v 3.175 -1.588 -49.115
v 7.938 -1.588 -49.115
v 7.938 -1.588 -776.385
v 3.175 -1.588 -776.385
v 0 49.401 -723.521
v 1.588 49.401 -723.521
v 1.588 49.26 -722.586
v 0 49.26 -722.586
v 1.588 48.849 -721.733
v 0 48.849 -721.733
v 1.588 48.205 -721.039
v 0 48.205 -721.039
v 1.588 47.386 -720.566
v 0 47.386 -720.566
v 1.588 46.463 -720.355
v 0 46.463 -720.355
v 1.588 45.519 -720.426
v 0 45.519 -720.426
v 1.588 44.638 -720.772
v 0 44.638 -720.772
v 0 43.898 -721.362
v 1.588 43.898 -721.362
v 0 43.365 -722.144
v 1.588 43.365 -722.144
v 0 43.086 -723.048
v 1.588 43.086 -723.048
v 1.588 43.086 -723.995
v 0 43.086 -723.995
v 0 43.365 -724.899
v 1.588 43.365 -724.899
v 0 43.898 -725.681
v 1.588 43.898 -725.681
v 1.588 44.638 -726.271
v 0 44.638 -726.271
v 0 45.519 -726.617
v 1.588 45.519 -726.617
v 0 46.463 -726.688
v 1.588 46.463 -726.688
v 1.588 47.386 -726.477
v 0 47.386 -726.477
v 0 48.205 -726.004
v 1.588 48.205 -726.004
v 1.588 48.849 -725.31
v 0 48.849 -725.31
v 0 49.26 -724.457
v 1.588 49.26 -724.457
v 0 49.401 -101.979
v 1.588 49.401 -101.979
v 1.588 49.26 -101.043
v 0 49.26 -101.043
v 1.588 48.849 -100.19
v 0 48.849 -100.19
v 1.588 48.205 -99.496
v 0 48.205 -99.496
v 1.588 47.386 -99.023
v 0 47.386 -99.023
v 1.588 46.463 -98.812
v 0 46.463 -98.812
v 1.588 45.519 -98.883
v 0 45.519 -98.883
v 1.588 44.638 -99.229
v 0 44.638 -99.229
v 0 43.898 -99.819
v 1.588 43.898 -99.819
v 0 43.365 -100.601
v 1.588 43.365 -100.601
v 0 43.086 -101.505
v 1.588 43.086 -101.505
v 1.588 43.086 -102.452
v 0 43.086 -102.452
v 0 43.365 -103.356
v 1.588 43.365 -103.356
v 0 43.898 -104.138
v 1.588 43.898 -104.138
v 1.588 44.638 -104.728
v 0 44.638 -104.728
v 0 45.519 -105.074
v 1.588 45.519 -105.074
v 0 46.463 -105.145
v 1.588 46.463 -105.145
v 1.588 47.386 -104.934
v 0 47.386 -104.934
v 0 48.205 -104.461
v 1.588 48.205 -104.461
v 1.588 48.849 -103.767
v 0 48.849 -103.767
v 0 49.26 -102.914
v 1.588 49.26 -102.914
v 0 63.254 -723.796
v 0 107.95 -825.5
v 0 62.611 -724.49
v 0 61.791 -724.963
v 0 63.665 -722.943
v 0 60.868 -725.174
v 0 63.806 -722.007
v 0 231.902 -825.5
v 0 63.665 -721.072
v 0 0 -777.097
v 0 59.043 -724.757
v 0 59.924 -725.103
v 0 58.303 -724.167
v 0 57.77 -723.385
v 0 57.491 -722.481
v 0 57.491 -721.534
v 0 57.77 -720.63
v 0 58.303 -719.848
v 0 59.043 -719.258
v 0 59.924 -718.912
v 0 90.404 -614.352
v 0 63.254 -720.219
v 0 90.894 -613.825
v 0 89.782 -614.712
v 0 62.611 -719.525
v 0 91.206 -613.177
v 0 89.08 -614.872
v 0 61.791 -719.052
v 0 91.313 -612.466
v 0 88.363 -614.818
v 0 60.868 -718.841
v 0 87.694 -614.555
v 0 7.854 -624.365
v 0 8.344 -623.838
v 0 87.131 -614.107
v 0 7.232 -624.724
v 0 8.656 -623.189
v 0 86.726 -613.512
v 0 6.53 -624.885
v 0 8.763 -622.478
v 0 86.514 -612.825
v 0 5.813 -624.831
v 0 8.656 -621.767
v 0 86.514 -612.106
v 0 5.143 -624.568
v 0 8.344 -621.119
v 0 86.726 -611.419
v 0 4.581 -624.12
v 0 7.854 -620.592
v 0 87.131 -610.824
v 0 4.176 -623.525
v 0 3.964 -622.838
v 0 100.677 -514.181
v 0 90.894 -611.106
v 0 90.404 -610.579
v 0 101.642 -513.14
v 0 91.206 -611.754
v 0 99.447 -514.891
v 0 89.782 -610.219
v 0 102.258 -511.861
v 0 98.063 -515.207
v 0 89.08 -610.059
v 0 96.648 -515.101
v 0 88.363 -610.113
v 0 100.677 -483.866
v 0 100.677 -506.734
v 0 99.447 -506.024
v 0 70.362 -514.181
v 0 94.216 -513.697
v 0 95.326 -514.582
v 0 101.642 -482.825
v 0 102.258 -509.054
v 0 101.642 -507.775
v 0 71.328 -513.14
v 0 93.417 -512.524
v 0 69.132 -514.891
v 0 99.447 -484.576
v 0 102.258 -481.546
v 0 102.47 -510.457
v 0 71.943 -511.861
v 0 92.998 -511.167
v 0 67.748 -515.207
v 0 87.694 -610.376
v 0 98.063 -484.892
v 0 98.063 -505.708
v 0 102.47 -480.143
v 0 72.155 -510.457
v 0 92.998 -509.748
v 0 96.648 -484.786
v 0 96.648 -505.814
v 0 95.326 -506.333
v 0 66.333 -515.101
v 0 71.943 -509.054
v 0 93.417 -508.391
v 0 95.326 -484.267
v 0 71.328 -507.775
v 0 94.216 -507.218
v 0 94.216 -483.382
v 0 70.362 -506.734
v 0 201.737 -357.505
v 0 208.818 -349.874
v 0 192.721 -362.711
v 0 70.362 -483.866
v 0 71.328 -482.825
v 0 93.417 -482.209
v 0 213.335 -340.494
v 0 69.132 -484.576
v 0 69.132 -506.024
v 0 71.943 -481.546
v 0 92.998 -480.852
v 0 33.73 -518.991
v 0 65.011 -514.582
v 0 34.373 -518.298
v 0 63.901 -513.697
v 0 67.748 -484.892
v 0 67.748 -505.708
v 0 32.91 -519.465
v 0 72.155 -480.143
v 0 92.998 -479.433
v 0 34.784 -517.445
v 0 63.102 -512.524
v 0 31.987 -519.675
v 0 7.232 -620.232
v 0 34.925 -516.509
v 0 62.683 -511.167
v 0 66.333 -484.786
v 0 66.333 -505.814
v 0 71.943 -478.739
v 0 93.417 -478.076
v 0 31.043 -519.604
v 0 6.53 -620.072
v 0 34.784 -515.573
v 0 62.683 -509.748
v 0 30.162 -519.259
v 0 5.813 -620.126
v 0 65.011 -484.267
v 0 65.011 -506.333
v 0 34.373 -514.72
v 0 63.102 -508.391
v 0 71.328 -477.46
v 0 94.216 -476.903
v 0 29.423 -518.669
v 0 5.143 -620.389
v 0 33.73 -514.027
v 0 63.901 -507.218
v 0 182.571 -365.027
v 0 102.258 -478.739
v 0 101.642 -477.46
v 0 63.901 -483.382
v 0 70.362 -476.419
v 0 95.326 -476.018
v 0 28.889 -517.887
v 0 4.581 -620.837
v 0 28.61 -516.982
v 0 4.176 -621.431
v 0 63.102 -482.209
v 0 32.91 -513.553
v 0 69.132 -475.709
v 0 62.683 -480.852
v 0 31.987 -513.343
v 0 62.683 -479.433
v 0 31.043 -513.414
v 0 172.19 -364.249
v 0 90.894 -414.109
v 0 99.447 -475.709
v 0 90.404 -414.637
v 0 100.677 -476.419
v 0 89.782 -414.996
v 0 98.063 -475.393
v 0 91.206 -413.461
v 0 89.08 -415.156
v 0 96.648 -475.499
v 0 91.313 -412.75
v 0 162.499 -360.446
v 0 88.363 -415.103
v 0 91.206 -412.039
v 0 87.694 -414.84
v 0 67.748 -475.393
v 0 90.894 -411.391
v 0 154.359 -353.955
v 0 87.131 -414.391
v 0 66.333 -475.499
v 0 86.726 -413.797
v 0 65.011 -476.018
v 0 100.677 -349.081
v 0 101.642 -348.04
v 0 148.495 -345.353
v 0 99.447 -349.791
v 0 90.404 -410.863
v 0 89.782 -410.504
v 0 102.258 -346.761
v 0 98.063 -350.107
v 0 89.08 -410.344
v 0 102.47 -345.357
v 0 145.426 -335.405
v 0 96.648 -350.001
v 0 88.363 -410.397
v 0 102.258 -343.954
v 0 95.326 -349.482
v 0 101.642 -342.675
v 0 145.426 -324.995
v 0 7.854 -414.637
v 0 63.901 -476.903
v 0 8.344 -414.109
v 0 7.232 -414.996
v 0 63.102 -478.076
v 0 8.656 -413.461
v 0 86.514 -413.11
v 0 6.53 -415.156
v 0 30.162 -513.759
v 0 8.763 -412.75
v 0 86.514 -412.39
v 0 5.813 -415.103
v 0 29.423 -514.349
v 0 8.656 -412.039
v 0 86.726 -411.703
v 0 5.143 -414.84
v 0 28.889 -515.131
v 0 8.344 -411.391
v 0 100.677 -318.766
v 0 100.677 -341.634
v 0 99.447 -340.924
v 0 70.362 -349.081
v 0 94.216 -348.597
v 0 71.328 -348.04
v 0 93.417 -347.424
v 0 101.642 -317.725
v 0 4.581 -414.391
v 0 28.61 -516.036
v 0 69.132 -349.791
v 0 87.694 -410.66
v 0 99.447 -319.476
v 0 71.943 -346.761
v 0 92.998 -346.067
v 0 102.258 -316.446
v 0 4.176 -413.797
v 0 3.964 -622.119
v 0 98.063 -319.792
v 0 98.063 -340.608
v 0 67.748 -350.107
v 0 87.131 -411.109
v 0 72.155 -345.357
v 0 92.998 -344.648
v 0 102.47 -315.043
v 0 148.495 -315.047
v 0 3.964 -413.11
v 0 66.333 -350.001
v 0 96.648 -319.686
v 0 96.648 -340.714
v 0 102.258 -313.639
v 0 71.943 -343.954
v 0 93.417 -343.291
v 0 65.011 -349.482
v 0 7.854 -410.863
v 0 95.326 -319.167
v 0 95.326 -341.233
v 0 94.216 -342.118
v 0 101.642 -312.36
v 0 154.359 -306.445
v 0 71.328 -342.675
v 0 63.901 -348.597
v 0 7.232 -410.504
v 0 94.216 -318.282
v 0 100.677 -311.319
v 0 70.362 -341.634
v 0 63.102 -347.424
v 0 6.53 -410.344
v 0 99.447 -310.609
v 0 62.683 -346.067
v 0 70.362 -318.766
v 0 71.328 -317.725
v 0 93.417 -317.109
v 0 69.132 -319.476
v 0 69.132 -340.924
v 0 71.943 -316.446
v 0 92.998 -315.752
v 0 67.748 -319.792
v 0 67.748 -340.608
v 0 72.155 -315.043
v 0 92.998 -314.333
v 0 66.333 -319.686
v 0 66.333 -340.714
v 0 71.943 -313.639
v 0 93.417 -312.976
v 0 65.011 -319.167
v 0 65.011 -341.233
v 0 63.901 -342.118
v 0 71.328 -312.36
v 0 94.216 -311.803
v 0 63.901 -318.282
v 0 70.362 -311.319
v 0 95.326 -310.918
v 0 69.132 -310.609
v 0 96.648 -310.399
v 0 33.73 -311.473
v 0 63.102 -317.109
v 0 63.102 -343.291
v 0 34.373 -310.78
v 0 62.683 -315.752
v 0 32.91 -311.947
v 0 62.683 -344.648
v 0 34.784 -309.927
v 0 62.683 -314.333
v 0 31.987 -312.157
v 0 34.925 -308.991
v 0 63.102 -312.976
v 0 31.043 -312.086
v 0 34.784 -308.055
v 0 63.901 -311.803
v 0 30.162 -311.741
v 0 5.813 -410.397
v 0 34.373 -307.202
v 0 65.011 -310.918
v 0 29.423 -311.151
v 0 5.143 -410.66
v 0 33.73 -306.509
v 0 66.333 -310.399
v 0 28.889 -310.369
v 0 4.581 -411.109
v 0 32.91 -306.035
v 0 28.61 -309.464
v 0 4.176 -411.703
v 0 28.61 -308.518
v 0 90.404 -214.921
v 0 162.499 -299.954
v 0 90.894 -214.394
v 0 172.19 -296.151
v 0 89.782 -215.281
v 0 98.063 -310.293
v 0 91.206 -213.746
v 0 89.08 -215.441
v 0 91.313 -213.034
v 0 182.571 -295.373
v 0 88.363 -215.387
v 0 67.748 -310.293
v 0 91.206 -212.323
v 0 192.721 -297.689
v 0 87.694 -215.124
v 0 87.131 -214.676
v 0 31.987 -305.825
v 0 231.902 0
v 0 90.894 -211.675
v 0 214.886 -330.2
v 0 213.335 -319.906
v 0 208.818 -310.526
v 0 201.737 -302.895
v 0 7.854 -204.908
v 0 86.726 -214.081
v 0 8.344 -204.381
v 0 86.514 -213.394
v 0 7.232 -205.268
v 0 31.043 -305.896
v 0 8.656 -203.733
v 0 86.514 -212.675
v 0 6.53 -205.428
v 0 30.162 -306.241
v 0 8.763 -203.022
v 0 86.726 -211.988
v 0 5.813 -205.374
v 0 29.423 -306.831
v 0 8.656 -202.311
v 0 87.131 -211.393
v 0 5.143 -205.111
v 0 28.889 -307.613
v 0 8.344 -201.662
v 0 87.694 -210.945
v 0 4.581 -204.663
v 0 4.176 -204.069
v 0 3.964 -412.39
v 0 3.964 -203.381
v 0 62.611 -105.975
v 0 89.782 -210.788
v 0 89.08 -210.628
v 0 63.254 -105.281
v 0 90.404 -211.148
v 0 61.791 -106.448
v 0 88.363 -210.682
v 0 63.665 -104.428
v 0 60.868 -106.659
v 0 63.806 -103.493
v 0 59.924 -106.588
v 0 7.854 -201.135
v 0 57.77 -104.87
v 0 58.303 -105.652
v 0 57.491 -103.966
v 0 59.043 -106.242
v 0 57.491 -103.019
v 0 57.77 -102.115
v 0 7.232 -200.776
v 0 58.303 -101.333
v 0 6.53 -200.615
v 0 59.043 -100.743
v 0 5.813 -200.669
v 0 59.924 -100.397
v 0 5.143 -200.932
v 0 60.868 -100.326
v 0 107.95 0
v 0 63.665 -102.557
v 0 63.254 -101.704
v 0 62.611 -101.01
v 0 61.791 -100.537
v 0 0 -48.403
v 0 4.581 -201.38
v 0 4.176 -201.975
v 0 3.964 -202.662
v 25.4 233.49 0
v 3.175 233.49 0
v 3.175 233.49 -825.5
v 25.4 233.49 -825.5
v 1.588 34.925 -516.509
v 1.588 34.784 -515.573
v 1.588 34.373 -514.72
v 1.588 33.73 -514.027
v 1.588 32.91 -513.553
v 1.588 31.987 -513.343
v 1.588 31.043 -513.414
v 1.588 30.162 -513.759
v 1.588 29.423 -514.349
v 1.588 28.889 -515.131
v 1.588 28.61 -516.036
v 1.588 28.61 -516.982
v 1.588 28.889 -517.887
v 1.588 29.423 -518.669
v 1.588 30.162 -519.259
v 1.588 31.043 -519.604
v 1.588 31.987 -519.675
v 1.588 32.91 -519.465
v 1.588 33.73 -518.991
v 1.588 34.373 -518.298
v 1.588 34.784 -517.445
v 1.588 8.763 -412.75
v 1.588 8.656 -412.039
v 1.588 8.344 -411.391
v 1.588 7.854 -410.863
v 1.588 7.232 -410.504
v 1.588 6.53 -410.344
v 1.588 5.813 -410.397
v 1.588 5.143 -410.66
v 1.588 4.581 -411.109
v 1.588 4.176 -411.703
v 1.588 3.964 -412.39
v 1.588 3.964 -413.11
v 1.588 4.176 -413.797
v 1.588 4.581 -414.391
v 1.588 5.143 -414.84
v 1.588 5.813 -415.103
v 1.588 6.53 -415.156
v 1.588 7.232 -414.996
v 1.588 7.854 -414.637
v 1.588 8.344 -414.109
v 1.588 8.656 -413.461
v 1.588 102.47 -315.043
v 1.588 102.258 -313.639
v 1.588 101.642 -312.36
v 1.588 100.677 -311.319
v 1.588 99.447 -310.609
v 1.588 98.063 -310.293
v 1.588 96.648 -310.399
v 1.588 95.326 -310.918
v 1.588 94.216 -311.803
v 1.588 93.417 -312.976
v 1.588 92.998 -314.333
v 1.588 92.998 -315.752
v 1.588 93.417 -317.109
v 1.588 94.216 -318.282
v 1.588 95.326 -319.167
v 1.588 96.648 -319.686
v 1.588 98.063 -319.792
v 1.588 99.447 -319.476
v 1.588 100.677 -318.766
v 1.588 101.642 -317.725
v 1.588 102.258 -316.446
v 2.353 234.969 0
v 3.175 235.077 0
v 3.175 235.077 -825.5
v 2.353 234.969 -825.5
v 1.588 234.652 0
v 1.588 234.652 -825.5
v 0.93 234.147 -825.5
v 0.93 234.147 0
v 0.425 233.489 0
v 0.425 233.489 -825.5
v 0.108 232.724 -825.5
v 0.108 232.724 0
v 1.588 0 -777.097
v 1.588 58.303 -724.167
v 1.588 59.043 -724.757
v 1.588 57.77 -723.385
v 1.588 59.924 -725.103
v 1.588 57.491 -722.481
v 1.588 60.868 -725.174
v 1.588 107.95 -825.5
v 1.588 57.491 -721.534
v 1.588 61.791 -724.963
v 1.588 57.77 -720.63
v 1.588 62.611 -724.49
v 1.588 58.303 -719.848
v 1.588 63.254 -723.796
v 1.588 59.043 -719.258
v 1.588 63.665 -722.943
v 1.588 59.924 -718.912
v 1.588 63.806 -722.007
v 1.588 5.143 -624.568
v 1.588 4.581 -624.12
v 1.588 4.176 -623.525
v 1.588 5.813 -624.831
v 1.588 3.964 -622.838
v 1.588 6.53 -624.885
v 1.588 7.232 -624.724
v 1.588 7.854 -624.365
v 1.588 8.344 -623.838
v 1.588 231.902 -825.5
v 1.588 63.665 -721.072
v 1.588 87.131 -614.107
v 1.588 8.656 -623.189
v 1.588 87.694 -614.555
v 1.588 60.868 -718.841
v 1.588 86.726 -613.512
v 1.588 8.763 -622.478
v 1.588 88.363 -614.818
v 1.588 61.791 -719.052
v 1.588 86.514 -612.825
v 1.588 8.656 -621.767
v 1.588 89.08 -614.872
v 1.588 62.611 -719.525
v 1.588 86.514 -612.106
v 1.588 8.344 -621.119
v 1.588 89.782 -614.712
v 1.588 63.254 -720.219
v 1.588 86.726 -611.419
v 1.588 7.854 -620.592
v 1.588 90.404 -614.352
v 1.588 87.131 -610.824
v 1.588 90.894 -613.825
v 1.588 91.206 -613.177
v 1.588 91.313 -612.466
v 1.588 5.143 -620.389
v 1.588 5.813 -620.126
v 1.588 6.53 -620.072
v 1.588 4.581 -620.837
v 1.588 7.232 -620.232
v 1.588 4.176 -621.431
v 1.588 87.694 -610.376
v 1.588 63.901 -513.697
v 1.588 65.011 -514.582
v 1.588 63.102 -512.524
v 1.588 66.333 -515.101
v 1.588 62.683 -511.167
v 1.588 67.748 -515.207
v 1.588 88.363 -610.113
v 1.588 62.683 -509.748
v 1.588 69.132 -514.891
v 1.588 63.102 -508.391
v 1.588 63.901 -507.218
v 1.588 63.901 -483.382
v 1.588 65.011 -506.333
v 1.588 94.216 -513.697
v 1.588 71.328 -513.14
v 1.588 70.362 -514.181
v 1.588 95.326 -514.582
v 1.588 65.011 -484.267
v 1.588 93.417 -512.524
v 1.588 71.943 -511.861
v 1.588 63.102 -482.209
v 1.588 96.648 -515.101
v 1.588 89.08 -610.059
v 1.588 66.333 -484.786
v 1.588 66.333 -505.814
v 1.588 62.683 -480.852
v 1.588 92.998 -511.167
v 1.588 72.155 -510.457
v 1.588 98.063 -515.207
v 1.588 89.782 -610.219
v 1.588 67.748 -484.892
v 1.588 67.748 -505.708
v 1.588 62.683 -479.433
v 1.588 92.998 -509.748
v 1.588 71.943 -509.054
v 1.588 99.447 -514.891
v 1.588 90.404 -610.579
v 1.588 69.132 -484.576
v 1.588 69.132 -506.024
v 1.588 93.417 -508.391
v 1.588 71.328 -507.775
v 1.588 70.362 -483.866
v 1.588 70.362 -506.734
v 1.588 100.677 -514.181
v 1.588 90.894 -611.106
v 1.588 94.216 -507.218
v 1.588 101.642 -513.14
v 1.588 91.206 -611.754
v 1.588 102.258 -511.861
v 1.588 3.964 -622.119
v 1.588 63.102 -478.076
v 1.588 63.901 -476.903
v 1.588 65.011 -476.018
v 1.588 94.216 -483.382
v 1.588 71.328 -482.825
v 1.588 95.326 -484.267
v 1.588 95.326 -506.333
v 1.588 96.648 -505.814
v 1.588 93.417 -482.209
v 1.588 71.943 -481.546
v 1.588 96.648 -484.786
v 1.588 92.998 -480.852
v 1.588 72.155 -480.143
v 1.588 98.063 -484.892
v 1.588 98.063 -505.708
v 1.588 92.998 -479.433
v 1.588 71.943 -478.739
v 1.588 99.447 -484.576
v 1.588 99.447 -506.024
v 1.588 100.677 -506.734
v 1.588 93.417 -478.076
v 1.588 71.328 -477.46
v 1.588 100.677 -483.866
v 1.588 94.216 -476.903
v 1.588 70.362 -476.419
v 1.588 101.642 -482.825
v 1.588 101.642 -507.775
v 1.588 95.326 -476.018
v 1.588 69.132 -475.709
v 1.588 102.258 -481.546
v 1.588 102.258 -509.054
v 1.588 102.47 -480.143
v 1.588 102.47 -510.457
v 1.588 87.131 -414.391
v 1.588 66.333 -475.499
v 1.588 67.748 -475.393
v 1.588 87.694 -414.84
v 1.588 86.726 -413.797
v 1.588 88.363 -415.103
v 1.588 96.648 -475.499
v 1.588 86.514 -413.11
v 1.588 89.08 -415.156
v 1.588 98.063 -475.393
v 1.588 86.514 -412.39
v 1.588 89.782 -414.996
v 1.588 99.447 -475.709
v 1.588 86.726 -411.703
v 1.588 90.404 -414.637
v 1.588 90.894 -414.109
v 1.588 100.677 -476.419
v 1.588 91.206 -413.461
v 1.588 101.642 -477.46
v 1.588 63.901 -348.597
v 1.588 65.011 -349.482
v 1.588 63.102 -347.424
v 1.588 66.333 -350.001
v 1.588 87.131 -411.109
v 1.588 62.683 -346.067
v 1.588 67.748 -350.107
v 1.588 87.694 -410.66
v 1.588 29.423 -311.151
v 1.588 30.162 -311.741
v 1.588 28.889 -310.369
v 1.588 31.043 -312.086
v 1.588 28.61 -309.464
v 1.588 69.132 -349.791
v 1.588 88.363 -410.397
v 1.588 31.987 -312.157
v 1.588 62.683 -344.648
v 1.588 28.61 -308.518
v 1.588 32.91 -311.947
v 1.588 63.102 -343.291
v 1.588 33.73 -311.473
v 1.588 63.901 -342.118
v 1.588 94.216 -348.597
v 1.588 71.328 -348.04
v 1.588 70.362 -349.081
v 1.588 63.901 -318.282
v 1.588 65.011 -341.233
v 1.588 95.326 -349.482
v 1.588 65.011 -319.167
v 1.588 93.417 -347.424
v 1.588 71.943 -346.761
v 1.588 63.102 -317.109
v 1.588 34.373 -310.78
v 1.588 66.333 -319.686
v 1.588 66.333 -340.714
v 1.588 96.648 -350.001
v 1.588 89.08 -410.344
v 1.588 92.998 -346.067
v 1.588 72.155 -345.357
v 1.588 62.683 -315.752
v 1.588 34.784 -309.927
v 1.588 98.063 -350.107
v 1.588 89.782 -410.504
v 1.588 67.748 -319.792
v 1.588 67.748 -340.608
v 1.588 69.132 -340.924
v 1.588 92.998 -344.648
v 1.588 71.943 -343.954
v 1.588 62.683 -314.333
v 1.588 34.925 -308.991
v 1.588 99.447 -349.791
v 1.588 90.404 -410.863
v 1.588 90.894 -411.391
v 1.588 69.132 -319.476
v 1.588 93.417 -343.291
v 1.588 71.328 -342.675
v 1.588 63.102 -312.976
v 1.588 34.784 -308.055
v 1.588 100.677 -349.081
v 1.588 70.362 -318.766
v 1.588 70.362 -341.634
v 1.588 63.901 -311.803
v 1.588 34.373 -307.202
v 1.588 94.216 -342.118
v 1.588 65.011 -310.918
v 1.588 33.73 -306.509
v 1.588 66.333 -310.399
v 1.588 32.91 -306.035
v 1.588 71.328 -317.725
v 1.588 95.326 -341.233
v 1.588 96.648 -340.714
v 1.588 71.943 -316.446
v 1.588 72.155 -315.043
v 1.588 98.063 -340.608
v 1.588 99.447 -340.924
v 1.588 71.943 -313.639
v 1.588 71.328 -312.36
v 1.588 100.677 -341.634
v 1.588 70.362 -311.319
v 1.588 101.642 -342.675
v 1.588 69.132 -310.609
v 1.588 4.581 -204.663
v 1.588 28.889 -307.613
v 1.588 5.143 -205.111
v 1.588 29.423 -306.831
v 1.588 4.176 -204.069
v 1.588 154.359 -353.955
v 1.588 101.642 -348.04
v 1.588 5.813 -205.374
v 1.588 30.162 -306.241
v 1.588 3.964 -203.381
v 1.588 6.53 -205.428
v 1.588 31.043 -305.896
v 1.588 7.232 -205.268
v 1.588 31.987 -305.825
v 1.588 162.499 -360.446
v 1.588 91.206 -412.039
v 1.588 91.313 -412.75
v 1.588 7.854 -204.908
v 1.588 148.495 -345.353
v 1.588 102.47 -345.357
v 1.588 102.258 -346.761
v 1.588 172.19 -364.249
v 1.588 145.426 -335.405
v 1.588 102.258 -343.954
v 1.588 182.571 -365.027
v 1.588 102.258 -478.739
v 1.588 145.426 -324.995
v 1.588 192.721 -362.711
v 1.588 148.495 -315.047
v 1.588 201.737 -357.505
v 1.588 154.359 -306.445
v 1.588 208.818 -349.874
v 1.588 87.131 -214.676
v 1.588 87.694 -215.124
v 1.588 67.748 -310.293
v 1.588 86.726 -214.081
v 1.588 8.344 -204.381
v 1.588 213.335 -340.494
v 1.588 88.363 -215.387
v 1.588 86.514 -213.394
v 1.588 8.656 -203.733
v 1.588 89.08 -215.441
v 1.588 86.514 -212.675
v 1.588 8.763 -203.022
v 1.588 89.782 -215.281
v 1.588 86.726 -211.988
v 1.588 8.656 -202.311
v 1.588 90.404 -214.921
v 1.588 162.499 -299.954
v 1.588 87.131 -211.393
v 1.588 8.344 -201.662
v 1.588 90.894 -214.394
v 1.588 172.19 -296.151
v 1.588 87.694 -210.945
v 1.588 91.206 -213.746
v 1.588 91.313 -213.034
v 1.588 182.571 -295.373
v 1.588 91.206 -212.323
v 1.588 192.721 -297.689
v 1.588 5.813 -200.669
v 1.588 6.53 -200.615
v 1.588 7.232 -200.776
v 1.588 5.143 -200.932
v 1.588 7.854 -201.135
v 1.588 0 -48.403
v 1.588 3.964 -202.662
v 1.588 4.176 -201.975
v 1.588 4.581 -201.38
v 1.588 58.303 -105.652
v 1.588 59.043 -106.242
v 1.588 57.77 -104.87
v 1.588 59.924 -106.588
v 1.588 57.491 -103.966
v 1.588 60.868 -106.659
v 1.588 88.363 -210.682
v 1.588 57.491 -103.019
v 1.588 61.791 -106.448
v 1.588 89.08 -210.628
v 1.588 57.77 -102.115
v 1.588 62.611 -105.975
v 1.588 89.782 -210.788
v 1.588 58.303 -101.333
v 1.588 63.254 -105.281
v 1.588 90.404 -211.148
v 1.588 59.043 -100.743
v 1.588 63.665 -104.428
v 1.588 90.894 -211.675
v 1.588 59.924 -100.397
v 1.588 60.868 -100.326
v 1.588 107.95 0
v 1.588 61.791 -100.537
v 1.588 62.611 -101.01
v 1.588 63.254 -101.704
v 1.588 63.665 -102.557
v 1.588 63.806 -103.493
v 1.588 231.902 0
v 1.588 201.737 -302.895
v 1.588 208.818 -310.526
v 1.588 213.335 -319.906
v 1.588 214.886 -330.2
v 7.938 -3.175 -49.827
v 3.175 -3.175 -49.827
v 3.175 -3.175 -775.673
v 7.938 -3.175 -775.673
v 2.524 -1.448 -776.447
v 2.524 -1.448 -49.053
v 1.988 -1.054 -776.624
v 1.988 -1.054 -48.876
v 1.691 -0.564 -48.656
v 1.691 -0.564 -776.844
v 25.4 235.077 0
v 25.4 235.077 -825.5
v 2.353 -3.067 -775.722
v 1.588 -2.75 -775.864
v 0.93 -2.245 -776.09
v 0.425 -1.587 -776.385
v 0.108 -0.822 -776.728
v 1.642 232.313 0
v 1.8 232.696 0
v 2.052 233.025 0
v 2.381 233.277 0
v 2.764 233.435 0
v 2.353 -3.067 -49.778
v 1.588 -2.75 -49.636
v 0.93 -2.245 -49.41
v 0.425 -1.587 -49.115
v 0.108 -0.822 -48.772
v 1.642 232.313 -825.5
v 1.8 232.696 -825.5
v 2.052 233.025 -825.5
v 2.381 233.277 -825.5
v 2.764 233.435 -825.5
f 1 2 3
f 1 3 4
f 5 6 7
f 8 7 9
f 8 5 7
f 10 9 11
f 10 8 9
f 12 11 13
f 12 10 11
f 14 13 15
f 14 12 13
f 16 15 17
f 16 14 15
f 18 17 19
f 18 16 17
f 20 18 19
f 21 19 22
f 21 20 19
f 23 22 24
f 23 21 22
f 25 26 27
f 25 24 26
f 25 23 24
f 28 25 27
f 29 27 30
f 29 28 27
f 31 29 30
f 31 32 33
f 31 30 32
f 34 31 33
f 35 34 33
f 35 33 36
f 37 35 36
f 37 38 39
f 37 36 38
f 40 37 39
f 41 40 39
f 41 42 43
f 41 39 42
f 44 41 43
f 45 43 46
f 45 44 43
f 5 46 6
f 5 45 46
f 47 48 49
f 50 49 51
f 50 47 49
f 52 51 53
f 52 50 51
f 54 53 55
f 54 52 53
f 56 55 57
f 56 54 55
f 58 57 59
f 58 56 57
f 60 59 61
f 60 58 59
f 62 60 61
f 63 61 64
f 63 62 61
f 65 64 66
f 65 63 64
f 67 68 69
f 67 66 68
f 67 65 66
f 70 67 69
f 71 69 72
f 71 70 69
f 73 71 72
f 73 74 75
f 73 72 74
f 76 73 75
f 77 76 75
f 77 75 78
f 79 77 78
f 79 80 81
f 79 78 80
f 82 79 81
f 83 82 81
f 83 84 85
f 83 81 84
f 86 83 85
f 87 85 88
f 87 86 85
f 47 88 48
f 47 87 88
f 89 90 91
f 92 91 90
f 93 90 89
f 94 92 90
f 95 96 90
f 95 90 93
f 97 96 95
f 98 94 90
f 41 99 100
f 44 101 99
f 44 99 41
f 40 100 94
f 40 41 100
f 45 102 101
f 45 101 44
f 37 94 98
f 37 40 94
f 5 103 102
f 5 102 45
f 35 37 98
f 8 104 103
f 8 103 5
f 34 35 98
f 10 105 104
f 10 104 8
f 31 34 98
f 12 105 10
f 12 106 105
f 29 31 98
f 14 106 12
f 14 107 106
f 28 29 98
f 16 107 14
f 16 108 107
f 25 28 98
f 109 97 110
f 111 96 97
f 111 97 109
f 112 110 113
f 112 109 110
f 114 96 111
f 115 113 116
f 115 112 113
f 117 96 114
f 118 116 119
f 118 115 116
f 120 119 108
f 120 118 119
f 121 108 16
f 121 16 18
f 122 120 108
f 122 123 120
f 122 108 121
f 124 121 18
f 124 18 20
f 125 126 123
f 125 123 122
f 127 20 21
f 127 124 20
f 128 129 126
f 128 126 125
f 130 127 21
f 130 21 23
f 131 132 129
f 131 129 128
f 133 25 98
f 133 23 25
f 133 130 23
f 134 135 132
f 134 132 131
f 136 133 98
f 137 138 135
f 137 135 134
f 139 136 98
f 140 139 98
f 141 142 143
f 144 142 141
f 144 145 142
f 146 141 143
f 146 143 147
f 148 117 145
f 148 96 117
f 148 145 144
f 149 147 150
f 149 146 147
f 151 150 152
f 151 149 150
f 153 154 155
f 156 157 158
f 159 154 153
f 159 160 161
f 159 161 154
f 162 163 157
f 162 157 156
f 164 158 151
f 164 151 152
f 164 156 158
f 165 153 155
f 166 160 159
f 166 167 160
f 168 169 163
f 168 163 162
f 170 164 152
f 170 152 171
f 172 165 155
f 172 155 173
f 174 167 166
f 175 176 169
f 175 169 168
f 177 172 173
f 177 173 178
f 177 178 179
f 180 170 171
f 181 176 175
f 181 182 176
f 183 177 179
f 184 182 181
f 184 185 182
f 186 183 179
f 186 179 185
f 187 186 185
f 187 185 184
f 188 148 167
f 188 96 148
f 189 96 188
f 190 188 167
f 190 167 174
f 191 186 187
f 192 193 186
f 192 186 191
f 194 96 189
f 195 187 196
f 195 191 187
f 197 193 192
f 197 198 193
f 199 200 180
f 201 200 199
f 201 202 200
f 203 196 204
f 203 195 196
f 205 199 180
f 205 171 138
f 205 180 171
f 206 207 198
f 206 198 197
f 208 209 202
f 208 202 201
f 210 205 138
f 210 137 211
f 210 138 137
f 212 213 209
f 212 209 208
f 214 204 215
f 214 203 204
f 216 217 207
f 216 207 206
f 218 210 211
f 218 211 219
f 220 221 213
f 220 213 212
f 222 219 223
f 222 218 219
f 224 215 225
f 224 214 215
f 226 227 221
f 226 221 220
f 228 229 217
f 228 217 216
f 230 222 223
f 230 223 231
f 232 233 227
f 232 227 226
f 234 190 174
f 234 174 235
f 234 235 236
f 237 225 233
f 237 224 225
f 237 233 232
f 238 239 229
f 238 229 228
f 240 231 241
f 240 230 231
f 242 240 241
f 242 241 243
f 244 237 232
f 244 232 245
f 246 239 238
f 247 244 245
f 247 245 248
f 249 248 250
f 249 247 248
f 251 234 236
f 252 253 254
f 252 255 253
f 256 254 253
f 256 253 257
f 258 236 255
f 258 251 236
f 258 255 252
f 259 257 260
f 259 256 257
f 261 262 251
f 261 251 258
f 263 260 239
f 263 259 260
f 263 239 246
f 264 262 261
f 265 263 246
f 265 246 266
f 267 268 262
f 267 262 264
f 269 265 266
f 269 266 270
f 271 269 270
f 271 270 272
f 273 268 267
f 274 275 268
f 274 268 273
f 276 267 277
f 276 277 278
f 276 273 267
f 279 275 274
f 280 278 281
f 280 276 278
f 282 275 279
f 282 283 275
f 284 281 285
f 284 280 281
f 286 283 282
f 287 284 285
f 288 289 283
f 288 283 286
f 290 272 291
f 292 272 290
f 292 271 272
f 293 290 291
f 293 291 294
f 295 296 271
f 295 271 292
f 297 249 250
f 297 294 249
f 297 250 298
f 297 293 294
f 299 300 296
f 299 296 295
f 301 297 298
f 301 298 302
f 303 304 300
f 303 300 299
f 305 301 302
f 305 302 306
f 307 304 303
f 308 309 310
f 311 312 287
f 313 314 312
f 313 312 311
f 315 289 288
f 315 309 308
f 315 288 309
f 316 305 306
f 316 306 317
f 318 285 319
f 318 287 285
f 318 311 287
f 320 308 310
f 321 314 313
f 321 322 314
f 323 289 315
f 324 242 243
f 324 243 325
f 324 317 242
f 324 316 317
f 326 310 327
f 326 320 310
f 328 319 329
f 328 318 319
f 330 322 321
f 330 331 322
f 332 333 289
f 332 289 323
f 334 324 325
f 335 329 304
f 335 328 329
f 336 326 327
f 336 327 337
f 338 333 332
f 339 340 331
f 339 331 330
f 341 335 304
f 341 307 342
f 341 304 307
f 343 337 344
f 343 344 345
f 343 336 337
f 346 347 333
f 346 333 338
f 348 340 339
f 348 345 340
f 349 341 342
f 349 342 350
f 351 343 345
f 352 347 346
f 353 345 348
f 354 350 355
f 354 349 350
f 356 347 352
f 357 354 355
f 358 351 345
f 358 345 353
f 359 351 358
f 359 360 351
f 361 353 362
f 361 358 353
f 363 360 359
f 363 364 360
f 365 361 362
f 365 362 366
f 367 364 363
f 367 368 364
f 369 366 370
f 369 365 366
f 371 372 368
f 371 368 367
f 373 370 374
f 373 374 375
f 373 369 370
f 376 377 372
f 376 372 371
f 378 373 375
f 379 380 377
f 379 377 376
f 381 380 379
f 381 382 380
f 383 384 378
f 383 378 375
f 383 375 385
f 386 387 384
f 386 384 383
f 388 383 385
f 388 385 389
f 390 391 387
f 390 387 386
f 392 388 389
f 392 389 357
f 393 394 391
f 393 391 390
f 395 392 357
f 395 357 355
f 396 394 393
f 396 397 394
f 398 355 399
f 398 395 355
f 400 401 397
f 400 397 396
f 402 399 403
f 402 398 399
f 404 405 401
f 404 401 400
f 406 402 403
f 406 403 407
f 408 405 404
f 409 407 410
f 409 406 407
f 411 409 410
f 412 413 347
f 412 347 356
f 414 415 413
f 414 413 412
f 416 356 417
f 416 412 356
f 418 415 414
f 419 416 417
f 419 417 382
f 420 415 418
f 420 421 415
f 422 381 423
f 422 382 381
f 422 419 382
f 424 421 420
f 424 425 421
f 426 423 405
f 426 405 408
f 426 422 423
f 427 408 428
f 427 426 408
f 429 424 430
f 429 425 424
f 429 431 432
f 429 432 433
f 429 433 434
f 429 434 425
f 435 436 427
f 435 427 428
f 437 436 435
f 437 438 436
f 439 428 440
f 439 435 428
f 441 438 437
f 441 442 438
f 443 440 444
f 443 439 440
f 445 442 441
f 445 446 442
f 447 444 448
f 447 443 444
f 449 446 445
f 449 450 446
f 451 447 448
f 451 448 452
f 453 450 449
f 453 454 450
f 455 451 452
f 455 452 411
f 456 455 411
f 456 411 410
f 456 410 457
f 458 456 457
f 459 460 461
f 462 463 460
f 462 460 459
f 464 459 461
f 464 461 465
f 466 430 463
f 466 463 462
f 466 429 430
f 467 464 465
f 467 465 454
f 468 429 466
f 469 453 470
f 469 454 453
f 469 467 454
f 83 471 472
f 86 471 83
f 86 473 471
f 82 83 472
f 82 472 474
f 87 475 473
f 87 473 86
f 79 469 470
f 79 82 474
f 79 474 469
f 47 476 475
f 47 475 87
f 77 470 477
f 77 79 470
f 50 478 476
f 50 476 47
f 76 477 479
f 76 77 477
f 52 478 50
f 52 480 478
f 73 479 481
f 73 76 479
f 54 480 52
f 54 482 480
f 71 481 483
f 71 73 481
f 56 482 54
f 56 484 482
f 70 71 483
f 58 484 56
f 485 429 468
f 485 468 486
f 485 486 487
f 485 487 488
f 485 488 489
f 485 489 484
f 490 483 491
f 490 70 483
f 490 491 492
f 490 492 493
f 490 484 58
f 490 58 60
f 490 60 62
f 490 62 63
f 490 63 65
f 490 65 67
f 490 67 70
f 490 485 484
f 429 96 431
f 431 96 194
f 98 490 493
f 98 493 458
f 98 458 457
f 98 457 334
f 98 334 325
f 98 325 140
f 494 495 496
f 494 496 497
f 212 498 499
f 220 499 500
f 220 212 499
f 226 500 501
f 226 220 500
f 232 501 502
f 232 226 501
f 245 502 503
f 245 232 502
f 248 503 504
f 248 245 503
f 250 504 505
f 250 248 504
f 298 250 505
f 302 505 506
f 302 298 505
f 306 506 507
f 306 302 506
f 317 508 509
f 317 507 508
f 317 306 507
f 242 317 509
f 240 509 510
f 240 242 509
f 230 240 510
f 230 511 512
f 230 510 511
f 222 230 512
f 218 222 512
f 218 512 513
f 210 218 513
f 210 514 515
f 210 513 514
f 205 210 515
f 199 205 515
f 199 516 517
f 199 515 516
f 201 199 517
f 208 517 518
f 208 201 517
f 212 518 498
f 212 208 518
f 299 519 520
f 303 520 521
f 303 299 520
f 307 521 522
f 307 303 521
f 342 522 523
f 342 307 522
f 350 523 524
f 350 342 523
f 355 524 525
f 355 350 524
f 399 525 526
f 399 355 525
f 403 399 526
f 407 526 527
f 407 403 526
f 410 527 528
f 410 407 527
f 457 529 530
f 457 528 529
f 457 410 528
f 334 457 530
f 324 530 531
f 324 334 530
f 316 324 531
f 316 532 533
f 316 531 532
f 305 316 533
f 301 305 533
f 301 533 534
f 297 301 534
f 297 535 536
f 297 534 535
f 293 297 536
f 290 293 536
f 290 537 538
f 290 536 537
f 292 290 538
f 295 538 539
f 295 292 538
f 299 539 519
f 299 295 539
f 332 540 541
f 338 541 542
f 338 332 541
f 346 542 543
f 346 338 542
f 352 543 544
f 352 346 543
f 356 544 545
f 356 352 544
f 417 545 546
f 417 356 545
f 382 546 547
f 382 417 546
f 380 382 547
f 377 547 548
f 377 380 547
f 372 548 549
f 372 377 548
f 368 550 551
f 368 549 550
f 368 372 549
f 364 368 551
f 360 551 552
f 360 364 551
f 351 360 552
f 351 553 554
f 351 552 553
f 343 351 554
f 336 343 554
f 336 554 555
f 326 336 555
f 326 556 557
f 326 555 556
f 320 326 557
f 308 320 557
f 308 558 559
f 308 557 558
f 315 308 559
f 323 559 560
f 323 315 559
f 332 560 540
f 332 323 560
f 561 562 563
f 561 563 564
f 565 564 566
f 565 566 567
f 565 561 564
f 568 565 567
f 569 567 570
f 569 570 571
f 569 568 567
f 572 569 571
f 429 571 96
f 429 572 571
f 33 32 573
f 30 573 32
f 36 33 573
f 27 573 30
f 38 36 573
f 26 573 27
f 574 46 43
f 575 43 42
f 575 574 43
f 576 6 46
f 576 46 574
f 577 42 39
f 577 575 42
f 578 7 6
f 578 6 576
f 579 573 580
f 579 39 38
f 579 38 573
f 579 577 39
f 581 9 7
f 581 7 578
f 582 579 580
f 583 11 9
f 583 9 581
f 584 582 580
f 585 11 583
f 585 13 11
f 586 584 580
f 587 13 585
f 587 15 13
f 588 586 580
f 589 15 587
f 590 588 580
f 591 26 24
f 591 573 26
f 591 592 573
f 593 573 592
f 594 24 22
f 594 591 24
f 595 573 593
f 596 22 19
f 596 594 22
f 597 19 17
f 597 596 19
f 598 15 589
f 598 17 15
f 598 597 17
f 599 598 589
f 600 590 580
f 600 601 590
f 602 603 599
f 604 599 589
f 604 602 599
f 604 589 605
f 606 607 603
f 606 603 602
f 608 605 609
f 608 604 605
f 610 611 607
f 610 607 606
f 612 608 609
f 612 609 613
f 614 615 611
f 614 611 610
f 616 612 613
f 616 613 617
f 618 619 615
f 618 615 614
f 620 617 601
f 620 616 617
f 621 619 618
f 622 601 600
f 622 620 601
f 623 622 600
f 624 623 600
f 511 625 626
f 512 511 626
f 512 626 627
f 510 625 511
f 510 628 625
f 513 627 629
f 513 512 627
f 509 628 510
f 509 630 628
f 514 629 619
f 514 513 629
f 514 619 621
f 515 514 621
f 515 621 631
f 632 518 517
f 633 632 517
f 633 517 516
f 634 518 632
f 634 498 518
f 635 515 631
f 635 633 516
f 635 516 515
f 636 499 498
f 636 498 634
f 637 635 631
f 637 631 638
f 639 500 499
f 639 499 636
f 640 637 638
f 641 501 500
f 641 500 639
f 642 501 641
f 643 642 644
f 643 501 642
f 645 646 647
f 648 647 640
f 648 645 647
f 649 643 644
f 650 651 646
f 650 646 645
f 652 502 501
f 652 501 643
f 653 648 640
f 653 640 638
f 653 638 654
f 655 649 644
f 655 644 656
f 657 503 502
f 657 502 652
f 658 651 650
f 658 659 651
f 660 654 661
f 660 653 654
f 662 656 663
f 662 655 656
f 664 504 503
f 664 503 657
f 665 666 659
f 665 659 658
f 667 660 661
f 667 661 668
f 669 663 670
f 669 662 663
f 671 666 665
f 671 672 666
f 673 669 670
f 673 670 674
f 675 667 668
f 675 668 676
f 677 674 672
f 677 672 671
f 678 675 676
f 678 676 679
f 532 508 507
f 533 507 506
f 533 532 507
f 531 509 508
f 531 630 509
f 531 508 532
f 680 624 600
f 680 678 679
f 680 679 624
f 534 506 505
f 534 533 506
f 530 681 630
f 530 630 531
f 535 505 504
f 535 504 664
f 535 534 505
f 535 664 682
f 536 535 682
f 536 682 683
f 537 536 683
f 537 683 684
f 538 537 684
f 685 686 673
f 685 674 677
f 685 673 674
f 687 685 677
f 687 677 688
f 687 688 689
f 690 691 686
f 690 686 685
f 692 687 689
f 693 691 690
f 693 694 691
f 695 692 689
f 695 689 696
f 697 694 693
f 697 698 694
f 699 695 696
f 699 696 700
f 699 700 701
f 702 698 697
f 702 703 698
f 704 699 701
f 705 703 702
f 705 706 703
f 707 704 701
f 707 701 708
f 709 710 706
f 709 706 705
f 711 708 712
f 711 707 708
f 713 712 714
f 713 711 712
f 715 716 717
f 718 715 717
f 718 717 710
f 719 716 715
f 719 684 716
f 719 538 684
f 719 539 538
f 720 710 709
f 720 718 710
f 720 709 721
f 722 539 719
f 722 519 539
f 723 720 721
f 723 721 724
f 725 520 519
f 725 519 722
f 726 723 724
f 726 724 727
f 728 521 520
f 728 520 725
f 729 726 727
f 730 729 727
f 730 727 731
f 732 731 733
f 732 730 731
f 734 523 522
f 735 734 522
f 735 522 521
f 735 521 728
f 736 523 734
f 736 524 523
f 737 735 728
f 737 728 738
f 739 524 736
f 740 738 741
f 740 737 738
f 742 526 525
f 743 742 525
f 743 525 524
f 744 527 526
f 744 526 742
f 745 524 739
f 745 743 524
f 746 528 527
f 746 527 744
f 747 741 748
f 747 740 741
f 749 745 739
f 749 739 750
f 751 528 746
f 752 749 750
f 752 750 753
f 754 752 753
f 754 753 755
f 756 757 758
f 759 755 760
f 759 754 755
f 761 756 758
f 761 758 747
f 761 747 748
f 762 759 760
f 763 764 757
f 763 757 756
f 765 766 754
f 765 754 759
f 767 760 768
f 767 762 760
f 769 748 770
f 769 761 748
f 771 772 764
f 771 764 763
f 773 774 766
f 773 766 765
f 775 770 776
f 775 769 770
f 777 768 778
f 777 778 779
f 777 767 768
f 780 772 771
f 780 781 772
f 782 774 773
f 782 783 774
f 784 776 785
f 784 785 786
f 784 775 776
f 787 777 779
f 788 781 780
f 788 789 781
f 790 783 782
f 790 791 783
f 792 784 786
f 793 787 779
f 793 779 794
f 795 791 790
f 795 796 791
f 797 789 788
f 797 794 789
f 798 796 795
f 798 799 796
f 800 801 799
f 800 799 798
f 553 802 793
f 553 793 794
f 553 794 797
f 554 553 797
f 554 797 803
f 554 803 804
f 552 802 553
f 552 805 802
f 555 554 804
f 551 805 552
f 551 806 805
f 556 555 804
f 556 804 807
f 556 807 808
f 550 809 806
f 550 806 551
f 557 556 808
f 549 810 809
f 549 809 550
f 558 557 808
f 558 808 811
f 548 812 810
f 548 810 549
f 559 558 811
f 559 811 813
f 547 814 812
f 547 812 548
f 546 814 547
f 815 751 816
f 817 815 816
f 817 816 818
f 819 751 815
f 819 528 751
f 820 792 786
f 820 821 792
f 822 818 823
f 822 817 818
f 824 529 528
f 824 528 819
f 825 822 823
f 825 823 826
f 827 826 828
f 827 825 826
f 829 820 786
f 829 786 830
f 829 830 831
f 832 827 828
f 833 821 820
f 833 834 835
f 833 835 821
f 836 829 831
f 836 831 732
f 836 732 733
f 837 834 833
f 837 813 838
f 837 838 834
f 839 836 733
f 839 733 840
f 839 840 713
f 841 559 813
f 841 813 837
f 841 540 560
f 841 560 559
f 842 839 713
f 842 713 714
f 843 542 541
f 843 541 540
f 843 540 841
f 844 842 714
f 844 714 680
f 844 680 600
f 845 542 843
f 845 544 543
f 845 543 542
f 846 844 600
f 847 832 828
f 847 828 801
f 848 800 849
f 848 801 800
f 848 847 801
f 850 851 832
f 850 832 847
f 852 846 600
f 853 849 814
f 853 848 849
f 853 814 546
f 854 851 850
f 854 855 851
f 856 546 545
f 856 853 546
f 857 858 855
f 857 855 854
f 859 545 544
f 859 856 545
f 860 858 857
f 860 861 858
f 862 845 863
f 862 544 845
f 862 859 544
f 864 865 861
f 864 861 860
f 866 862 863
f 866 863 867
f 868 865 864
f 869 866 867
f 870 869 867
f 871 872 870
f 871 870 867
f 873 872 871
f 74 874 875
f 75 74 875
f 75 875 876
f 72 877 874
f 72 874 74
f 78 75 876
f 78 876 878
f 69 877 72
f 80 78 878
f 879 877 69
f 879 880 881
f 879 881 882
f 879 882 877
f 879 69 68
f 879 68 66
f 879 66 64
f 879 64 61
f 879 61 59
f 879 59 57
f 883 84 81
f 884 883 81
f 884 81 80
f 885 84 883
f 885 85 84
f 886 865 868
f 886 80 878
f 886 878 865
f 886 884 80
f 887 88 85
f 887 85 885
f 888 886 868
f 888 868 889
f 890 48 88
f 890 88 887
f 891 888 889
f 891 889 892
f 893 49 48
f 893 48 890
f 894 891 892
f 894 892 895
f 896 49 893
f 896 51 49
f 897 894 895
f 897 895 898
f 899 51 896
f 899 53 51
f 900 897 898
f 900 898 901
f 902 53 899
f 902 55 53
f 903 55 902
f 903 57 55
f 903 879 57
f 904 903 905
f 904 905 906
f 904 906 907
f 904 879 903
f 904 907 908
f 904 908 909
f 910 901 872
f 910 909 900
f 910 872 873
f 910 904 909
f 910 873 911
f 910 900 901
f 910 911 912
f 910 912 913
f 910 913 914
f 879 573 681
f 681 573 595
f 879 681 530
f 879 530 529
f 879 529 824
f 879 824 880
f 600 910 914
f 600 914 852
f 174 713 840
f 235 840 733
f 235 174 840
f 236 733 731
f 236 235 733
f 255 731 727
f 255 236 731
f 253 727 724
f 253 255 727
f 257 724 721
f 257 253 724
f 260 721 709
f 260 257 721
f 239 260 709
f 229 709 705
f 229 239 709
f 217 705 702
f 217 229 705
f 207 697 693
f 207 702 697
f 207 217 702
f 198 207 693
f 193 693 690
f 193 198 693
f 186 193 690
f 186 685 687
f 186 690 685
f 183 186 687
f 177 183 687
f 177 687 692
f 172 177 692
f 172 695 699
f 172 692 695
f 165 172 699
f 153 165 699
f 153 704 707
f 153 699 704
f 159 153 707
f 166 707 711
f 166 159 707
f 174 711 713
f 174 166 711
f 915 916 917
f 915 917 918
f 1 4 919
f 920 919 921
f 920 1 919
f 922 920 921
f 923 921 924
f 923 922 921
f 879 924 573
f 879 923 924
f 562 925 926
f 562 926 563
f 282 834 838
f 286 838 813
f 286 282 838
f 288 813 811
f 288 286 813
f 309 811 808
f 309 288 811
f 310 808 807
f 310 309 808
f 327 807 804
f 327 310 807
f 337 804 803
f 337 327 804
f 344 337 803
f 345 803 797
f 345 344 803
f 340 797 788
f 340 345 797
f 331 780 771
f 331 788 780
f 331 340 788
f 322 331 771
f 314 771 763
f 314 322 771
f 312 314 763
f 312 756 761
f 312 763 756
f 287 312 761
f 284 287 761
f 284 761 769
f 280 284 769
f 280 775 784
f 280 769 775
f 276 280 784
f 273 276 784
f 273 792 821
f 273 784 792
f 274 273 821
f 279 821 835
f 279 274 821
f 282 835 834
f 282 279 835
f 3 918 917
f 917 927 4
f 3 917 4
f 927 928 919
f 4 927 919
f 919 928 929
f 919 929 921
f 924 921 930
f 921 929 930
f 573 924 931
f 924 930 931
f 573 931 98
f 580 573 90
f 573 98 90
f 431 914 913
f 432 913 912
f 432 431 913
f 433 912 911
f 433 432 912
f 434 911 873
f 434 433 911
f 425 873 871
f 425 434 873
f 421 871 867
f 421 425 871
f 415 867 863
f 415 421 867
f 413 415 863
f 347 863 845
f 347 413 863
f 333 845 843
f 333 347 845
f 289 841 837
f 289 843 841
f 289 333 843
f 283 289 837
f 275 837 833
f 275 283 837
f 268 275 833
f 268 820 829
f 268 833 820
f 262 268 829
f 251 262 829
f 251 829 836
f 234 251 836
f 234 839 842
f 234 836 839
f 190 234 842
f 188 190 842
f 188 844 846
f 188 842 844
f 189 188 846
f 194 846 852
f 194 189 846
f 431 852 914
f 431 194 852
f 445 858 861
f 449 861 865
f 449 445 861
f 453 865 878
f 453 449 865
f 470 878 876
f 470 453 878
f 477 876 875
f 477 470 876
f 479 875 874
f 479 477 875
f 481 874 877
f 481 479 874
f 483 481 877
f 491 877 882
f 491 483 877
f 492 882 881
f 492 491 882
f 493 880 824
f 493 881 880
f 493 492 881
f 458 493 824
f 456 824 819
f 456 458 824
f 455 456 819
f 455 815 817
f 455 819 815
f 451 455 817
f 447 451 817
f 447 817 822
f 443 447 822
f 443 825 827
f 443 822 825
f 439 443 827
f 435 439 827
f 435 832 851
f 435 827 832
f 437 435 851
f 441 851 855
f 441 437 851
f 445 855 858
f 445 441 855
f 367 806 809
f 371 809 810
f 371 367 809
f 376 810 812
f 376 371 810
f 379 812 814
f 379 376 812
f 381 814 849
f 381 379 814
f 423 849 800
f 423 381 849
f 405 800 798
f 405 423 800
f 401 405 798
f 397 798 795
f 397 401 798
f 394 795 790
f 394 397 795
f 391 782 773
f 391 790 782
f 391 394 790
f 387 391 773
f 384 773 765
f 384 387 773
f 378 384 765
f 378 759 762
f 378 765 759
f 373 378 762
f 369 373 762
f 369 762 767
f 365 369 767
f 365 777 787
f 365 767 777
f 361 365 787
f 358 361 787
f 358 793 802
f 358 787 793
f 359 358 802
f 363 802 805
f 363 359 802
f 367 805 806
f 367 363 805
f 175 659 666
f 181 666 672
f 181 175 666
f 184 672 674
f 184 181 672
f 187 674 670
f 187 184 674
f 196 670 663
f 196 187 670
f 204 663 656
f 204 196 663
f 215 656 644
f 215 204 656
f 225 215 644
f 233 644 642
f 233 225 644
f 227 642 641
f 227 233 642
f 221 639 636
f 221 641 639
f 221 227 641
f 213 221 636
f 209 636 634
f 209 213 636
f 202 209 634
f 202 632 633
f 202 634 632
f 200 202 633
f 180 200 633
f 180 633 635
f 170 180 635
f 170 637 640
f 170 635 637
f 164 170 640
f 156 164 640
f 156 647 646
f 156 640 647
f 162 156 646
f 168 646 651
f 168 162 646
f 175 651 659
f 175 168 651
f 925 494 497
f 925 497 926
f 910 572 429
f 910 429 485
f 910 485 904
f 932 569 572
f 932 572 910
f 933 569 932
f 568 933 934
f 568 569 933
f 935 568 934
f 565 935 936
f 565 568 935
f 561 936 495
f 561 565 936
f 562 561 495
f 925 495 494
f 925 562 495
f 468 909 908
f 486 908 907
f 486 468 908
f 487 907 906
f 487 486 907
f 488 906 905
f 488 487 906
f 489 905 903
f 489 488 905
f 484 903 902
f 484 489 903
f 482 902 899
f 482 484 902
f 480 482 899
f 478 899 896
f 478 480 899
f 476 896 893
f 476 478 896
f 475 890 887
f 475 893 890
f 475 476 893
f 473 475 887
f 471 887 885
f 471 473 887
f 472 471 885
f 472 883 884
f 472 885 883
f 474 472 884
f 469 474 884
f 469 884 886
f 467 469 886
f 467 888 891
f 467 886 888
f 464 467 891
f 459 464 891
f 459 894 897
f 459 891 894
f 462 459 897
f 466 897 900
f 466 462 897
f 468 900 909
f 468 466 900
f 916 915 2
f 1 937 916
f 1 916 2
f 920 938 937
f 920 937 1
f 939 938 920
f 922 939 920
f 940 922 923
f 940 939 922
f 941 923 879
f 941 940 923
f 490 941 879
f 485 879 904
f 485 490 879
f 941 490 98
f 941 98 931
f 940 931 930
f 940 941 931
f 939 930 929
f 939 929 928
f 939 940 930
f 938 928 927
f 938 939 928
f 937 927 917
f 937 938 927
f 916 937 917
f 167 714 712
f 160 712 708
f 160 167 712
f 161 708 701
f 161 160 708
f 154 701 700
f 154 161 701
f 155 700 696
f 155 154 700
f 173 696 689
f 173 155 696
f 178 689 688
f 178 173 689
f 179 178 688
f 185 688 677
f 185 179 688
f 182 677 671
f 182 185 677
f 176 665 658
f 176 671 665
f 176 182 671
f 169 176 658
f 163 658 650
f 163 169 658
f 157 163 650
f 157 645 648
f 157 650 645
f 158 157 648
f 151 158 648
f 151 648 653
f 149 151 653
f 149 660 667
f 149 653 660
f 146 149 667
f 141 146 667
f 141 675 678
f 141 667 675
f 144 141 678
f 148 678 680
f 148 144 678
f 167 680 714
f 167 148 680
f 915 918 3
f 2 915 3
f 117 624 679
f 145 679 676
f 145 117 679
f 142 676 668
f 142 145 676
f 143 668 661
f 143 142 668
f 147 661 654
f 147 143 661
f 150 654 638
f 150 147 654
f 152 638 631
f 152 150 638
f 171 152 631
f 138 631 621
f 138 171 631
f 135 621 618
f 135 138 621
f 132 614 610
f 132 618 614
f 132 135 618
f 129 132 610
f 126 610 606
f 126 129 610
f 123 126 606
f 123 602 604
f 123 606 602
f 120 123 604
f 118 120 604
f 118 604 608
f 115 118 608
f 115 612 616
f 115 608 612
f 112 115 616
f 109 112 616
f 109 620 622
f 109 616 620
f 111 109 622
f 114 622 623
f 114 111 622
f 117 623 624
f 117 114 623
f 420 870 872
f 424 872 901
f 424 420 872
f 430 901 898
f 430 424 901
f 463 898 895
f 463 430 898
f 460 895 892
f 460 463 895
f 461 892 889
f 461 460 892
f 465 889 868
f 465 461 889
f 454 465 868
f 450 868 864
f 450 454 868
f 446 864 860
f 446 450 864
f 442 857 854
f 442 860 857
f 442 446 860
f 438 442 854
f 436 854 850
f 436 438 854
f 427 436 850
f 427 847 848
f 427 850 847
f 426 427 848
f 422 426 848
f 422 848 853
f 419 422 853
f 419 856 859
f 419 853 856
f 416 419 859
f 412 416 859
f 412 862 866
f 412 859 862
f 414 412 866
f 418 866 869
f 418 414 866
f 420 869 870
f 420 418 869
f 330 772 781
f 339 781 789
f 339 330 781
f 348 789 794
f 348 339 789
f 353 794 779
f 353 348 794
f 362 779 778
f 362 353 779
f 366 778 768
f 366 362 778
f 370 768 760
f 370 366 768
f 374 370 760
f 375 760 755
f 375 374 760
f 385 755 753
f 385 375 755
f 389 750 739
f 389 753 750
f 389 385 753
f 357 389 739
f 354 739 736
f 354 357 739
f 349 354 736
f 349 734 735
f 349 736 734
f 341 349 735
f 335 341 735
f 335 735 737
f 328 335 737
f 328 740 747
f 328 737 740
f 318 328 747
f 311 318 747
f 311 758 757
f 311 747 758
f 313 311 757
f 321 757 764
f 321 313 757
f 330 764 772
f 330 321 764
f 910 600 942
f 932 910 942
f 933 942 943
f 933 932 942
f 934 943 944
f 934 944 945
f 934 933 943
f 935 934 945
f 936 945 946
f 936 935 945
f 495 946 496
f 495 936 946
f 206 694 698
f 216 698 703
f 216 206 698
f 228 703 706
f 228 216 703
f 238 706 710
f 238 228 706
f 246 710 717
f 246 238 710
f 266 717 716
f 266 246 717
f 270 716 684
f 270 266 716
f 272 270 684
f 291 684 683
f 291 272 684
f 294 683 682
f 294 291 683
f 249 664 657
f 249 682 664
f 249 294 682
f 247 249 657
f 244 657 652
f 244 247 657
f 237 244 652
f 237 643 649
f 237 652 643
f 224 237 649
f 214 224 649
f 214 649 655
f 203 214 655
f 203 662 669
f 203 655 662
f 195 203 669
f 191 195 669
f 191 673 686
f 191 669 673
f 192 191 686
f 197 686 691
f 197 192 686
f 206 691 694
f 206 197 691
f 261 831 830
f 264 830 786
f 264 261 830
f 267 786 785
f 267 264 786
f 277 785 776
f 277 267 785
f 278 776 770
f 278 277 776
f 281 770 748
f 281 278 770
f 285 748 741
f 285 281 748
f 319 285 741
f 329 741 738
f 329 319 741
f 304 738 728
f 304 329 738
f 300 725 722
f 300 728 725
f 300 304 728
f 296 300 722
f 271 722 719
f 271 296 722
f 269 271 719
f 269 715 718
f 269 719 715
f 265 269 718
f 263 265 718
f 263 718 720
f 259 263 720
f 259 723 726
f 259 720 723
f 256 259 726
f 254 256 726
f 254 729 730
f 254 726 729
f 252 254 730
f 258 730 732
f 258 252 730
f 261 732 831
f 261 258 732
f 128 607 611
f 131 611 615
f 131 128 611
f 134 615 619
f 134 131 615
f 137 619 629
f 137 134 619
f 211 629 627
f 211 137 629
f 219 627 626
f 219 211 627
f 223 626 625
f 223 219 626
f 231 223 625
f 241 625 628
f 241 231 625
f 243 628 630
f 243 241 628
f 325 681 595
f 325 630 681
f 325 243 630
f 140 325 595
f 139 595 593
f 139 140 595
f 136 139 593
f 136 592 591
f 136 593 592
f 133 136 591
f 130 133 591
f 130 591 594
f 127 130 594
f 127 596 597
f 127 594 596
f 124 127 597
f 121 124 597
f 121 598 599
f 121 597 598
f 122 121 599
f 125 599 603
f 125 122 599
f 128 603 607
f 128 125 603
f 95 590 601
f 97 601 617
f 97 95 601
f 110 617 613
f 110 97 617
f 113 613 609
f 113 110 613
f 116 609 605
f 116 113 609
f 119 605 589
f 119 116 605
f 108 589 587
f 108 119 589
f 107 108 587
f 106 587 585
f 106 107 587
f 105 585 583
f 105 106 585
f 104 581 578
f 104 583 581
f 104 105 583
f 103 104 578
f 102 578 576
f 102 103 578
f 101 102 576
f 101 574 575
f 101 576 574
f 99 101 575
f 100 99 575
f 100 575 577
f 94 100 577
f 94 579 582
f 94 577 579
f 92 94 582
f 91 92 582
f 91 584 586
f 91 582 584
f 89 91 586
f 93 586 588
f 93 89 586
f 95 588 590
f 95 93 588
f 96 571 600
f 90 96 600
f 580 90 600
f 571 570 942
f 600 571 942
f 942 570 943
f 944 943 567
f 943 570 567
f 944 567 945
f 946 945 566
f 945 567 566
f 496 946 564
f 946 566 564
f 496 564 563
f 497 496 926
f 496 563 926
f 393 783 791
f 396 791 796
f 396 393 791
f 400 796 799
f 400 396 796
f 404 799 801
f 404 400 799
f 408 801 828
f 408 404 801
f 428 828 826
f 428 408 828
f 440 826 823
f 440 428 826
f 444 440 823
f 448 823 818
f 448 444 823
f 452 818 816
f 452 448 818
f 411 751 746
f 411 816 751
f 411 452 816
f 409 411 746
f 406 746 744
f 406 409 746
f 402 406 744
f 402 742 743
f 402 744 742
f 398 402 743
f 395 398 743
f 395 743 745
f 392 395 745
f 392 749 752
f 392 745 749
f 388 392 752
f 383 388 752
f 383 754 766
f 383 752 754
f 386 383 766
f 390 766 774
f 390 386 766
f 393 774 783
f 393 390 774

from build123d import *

# Parameters (mm, degrees)
BASE_FLANGE2_DEPTH = 825.5
SKETCH1_R          = 3.175
SKETCH1_R_2        = 2.413
SKETCH1_R_3        = 4.7625
SKETCH1_R_4        = 34.925
CUT_EXTRUDE3_DEPTH = 859.694710551


# Sheet-metal steps are written as plain solids
with BuildPart() as part:
    # Sketch3 → Base-Flange2 (new body)
    with BuildSketch(Plane.XY):
        with BuildLine():
            Line((3.175, 233.4895), (25.4, 233.4895))
            Line((25.4, 233.4895), (25.4, 235.077))
            Line((25.4, 235.077), (3.175, 235.077))
            ThreePointArc((3.175, 235.077), (0.92993597, 234.14706403), (0, 231.902))
            Line((0, 231.902), (0, 0))
            ThreePointArc((0, 0), (0.92993597, -2.24506403), (3.175, -3.175))
            Line((3.175, -3.175), (7.9375, -3.175))
            Line((7.9375, -3.175), (7.9375, -1.5875))
            Line((7.9375, -1.5875), (3.175, -1.5875))
            ThreePointArc((3.175, -1.5875), (2.052467985, -1.122532015), (1.5875, 0))
            Line((1.5875, 0), (1.5875, 231.902))
            ThreePointArc((1.5875, 231.902), (2.052467985, 233.024532015), (3.175, 233.4895))
        make_face()
    extrude(amount=-BASE_FLANGE2_DEPTH)

    # Sketch1 → Cut-Extrude3 (cut, through all)
    with BuildSketch(Plane(origin=(0, 0, 0), x_dir=(0, 0, -1), z_dir=(1, 0, 0))):
        with Locations(Location((516.509, 31.75, 0), (0, 0, 90))):
            Circle(SKETCH1_R)
        with Locations(Location((308.991, 31.75, 0), (0, 0, 90))):
            Circle(SKETCH1_R)
        with Locations(Location((103.492550911, 60.630923565, 0), (0, 0, 90))):
            Circle(SKETCH1_R)
        with Locations(Location((722.007449089, 60.630923565, 0), (0, 0, 90))):
            Circle(SKETCH1_R)
        with Locations(Location((412.75, 6.35, 0), (0, 0, 90))):
            Circle(SKETCH1_R_2)
        with Locations(Location((412.75, 88.9, 0), (0, 0, 90))):
            Circle(SKETCH1_R_2)
        with Locations(Location((622.478249316, 6.35, 0), (0, 0, 90))):
            Circle(SKETCH1_R_2)
        with Locations(Location((612.465522577, 88.9, 0), (0, 0, 90))):
            Circle(SKETCH1_R_2)
        with Locations(Location((203.021750684, 6.35, 0), (0, 0, 90))):
            Circle(SKETCH1_R_2)
        with Locations(Location((101.978503418, 46.225723918, 0), (0, 0, 90))):
            Circle(SKETCH1_R)
        with Locations(Location((723.521496582, 46.225723918, 0), (0, 0, 90))):
            Circle(SKETCH1_R)
        with Locations(Location((213.034477423, 88.9, 0), (0, 0, 90))):
            Circle(SKETCH1_R_2)
        with Locations(Location((510.45745, 97.70745, 0), (0, 0, 90))):
            Circle(SKETCH1_R_3)
        with Locations(Location((480.14255, 97.70745, 0), (0, 0, 90))):
            Circle(SKETCH1_R_3)
        with Locations(Location((480.14255, 67.39255, 0), (0, 0, 90))):
            Circle(SKETCH1_R_3)
        with Locations(Location((510.45745, 67.39255, 0), (0, 0, 90))):
            Circle(SKETCH1_R_3)
        with Locations(Location((345.35745, 97.70745, 0), (0, 0, 90))):
            Circle(SKETCH1_R_3)
        with Locations(Location((315.04255, 97.70745, 0), (0, 0, 90))):
            Circle(SKETCH1_R_3)
        with Locations(Location((345.35745, 67.39255, 0), (0, 0, 90))):
            Circle(SKETCH1_R_3)
        with Locations(Location((315.04255, 67.39255, 0), (0, 0, 90))):
            Circle(SKETCH1_R_3)
        with Locations(Location((330.2, 179.961124202, 0), (0, 0, 90))):
            Circle(SKETCH1_R_4)
        Polygon((775.673017562, -3.175), (825.5, 107.95), (825.5, -3.175), align=None)
        Polygon((0, 107.95), (0, -3.175), (49.826982438, -3.175), align=None)
    extrude(amount=CUT_EXTRUDE3_DEPTH, mode=Mode.SUBTRACT)


solid = part.part
